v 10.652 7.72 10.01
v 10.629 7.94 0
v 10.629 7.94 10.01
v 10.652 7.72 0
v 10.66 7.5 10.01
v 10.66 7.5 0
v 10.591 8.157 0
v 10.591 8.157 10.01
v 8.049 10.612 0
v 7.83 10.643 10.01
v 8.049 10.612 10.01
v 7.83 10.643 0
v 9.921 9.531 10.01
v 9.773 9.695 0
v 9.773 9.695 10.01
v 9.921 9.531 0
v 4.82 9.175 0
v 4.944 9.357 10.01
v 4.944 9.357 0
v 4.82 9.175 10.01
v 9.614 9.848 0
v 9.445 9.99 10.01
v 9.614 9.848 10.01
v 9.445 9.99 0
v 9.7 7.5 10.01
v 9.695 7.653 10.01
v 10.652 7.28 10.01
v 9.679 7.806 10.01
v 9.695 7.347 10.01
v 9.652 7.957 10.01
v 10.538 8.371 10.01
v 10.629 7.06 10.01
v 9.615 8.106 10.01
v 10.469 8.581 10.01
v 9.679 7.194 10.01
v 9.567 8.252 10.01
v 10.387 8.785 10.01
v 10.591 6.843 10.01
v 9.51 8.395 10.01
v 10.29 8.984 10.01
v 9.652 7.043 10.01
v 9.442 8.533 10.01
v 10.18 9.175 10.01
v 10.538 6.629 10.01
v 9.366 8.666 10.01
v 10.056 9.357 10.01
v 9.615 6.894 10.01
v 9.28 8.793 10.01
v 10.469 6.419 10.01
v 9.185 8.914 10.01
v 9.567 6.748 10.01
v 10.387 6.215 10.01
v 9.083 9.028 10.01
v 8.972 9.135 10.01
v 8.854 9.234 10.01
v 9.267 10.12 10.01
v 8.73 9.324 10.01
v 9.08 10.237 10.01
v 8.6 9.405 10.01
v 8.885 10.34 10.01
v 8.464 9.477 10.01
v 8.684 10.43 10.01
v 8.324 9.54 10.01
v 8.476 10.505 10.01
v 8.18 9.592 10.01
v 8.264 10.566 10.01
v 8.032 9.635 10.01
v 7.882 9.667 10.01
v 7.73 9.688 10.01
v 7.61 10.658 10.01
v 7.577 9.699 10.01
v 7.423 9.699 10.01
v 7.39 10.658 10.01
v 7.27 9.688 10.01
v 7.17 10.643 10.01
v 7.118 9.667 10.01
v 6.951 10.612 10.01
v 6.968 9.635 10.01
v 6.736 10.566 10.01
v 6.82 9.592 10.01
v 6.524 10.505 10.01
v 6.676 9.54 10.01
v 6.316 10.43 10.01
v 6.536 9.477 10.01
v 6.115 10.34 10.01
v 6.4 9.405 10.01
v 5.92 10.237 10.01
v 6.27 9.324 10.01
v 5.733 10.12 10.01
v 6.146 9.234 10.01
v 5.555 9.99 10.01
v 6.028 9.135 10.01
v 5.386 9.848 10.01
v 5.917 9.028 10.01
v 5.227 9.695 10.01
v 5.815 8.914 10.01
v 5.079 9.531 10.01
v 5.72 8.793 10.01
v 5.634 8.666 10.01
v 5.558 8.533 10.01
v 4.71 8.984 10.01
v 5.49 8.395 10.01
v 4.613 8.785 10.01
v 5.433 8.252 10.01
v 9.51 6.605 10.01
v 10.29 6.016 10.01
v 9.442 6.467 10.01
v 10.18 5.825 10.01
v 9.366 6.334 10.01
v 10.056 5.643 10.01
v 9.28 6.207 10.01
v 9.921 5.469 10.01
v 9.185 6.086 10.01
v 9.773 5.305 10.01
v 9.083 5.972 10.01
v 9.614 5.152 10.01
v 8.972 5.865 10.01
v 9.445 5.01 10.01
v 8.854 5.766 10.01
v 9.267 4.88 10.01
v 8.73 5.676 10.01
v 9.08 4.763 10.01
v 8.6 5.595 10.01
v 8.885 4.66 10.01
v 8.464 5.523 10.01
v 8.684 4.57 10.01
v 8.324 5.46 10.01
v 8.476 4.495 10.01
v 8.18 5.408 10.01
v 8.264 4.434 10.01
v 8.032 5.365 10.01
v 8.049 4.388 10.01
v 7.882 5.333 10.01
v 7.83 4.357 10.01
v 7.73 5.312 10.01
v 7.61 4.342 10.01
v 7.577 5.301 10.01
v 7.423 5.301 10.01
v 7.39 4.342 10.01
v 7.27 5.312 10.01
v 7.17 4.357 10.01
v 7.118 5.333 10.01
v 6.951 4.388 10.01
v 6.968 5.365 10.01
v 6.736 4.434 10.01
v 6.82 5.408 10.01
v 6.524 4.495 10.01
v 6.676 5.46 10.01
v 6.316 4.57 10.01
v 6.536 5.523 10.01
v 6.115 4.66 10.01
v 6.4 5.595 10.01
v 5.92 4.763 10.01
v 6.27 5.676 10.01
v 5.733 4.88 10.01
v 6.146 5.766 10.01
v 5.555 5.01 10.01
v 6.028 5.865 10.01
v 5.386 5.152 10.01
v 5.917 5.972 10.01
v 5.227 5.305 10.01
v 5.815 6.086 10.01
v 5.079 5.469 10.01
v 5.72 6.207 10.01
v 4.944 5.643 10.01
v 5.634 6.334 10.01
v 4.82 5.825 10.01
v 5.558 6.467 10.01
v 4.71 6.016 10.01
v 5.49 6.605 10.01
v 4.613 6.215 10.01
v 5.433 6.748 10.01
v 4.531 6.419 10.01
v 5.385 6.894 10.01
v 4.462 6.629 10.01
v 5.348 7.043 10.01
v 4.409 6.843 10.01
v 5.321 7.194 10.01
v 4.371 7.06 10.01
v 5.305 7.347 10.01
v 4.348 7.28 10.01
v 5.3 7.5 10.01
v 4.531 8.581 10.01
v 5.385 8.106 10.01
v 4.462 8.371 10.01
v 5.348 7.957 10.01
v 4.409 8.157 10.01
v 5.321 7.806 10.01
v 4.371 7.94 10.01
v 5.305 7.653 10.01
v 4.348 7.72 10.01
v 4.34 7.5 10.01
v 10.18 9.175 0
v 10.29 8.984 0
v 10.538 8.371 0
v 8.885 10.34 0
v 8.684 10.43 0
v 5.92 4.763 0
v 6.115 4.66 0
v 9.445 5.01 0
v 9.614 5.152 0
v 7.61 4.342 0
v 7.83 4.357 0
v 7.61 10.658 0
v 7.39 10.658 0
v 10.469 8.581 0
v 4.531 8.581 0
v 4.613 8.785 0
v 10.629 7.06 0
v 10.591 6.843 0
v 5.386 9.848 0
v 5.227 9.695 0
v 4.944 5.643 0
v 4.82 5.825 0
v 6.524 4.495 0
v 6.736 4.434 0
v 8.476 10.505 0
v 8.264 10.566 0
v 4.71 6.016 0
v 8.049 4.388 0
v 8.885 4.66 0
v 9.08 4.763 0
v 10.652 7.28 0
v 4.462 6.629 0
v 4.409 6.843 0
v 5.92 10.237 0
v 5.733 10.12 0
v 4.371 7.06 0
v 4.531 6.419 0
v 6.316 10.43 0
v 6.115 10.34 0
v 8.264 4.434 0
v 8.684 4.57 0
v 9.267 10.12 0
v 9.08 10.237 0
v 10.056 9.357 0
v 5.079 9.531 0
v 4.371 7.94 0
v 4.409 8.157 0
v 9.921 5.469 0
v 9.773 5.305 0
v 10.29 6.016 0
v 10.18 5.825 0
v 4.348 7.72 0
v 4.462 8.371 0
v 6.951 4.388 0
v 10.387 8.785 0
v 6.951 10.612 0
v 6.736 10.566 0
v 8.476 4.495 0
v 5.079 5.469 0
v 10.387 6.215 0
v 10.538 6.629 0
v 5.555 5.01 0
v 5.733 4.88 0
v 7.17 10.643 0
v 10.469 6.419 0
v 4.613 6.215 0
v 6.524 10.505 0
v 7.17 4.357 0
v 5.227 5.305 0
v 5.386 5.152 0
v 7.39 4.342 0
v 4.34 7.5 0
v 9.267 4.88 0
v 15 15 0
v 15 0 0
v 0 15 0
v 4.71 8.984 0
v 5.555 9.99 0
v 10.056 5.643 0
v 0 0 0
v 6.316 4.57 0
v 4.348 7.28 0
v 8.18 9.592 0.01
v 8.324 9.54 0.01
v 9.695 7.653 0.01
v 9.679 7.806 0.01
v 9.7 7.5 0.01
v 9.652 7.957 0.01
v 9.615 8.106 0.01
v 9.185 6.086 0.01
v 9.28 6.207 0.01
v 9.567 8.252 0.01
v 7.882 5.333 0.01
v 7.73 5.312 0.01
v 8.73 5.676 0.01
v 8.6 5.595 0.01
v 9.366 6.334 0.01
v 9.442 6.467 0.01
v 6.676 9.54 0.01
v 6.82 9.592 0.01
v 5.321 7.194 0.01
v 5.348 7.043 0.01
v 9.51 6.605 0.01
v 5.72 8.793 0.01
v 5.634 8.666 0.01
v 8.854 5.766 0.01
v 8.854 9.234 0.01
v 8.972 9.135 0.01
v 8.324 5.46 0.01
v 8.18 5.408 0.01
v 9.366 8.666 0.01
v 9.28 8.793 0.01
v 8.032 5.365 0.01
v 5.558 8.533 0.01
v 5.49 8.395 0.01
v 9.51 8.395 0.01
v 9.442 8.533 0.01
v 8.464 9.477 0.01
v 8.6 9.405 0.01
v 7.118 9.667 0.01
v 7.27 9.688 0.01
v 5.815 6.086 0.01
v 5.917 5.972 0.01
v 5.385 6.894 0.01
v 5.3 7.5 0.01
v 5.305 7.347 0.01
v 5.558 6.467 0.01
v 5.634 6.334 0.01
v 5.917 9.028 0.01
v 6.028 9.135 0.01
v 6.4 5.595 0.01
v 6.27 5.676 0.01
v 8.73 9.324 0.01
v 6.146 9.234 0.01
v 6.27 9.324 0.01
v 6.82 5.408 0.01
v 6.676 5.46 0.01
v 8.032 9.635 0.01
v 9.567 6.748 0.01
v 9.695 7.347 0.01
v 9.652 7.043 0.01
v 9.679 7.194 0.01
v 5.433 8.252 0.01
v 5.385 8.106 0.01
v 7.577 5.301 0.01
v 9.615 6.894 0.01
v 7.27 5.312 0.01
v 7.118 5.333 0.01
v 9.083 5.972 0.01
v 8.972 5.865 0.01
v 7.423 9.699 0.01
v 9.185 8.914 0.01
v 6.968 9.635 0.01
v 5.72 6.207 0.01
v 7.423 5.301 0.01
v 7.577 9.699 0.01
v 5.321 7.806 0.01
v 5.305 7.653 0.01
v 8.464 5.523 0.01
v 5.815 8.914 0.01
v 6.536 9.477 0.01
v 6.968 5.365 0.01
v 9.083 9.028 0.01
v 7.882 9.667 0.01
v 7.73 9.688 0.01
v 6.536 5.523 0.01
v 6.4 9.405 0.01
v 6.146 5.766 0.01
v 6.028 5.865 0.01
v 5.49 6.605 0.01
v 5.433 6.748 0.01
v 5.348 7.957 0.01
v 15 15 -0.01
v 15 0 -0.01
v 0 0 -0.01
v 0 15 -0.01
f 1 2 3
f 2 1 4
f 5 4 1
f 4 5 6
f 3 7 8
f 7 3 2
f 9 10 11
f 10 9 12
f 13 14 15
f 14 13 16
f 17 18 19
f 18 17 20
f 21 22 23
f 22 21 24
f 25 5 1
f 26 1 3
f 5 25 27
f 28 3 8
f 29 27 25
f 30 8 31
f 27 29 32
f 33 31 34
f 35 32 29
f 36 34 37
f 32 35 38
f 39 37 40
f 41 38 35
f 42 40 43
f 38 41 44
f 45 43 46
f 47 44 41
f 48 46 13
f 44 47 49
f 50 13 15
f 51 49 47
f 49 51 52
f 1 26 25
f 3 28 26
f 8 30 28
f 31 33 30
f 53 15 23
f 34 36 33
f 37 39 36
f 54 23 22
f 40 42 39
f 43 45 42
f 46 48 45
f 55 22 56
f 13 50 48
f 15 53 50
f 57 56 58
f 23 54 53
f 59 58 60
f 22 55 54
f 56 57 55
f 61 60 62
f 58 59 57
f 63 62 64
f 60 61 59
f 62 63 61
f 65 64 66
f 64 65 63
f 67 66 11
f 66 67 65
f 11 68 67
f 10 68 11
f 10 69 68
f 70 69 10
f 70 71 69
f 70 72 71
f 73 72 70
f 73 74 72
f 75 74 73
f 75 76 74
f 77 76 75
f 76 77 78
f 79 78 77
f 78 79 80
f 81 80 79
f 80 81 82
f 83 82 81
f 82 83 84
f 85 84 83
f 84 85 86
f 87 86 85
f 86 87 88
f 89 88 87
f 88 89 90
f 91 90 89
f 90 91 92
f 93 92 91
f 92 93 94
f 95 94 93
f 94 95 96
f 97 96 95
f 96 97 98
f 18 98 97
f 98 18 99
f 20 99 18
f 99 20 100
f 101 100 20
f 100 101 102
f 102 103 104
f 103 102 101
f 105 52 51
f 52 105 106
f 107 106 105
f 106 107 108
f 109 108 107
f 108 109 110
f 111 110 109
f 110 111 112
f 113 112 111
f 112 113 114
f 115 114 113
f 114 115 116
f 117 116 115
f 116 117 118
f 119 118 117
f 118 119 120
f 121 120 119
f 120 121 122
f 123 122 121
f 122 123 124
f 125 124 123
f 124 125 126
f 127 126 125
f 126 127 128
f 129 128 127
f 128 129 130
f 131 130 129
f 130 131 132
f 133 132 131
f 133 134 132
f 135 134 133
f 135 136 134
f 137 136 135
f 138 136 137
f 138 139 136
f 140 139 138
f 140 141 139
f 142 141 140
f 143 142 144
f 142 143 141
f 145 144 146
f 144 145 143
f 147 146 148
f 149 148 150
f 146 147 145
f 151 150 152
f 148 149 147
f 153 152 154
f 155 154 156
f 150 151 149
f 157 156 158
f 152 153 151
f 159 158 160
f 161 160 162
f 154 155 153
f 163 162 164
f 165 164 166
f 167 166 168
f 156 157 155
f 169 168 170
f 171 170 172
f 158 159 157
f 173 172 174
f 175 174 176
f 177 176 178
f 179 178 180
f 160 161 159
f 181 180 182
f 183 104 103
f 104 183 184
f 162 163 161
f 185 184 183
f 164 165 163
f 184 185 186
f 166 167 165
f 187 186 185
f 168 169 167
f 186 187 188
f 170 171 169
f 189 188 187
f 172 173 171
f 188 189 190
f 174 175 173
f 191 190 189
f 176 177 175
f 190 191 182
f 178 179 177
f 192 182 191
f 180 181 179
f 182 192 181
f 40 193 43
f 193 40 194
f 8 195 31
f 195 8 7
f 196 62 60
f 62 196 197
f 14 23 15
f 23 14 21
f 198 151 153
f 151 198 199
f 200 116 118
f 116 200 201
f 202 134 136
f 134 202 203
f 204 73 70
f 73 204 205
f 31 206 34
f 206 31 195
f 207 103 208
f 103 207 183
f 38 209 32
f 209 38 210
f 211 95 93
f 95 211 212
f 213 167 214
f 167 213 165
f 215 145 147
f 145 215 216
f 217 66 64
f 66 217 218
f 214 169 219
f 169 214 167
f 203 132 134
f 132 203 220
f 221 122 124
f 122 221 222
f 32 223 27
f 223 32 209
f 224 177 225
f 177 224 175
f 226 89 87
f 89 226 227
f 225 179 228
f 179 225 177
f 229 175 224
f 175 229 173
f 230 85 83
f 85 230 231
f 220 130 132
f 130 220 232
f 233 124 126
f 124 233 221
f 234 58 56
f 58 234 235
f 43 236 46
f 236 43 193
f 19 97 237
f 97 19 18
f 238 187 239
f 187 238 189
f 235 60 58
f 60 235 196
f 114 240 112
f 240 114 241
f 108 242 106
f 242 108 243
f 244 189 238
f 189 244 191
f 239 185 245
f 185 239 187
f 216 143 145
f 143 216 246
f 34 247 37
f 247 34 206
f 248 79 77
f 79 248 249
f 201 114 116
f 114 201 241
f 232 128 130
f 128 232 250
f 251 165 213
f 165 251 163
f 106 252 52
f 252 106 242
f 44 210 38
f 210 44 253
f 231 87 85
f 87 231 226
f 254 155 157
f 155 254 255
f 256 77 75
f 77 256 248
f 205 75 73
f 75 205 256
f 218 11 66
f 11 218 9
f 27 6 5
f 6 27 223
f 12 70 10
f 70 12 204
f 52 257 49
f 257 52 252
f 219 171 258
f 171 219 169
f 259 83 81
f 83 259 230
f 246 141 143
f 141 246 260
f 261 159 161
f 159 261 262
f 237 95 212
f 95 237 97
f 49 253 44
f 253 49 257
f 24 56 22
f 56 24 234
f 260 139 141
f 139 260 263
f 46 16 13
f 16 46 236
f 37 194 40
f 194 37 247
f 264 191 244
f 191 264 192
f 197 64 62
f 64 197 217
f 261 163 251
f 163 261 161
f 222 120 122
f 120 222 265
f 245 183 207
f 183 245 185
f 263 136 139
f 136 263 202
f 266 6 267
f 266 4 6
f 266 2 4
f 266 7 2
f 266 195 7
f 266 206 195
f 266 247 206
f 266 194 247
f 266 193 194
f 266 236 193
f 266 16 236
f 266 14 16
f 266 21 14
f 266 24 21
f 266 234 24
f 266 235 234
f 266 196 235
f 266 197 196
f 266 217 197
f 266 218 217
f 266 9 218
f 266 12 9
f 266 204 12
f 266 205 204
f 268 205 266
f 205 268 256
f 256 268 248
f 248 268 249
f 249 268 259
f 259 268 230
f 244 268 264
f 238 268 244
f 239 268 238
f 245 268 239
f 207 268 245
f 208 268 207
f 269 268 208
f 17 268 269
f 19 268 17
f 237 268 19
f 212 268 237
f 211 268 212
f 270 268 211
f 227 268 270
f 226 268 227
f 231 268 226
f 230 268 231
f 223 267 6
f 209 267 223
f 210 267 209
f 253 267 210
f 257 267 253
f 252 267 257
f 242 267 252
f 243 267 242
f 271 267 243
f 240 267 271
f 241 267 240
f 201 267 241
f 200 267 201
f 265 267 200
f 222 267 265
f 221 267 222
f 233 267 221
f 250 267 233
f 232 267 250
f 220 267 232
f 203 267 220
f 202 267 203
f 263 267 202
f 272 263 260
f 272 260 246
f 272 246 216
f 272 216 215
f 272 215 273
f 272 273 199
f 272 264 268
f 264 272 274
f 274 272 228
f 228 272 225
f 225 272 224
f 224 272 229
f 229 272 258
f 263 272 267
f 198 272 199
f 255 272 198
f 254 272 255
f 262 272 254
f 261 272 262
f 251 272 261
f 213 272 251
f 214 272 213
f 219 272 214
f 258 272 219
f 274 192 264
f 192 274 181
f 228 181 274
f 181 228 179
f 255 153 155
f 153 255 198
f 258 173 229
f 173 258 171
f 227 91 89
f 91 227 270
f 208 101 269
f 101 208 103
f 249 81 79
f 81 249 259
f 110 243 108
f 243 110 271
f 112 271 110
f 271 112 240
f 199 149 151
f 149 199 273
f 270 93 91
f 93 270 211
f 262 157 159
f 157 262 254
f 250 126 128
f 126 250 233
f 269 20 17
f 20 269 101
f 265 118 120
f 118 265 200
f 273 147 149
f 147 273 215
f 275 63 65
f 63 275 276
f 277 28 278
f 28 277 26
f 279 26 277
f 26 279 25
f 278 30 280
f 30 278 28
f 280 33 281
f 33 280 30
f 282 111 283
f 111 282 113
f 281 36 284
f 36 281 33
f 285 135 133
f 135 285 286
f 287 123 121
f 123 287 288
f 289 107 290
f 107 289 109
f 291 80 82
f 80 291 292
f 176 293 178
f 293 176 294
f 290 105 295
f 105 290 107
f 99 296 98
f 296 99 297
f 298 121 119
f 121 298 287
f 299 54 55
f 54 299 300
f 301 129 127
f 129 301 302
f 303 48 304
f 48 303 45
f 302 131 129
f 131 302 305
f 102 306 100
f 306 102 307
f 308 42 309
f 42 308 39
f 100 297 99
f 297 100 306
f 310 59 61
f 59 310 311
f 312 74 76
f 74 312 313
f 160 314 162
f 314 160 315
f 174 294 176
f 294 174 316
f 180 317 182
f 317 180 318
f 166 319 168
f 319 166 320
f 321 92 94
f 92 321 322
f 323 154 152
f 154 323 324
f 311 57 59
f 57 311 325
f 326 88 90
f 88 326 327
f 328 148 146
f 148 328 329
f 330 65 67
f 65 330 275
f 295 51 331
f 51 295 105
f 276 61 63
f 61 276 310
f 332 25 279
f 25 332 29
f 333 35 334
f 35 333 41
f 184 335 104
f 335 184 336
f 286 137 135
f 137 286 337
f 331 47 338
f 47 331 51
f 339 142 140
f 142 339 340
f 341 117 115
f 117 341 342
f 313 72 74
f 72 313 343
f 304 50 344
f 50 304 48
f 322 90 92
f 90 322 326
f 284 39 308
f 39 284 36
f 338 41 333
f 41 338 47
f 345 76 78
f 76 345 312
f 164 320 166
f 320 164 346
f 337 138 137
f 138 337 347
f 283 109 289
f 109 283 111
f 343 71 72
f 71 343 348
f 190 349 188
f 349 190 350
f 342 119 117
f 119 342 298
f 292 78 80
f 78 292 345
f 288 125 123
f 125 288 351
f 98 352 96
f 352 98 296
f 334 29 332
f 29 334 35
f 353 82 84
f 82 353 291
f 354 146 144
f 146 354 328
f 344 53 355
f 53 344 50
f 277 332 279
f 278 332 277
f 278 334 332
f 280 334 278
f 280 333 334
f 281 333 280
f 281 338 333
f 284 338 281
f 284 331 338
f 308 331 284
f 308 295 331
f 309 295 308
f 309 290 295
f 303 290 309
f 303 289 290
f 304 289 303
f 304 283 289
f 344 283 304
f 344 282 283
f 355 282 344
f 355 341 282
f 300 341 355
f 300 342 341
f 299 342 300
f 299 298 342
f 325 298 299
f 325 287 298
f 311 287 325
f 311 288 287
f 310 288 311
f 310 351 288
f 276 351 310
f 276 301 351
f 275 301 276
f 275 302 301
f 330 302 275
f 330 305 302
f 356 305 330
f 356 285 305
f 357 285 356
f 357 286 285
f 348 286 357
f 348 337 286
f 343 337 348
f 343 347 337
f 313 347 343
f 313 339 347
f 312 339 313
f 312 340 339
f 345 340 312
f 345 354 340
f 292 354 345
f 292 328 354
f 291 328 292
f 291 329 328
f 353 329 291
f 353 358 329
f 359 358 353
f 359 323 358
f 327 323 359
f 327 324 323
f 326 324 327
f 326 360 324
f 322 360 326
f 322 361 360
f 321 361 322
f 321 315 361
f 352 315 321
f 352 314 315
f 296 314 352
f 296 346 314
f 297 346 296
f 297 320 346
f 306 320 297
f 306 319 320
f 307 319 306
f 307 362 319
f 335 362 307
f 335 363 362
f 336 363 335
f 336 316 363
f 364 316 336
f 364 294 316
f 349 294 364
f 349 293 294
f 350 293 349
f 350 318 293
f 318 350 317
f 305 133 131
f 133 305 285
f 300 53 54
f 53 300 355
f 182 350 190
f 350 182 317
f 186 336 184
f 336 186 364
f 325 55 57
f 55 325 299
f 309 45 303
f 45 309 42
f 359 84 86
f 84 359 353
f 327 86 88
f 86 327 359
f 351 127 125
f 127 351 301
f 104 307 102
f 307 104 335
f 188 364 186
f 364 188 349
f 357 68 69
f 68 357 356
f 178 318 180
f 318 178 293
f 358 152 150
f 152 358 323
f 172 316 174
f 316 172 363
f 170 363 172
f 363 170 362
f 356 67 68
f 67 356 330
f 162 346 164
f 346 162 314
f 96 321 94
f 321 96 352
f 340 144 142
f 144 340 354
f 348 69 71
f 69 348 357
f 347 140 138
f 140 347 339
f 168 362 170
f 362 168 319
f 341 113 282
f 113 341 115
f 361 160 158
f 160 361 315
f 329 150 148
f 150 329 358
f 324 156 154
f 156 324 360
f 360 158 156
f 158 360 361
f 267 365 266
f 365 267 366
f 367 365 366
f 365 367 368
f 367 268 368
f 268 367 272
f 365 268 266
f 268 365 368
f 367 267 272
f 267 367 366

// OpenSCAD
// file: ../Base/PlacementOptions.scad
// Fischertechnik Box Foundation
// Placement Options

// Alignment
NoAlign = 0;
AlignLeft = 1;
AlignBottom = 2;
AlignCenter = 3;
AlignRight = 4;
AlignTop = 5;

// Element rotation degree steps
rotations = [0, -90, -180, -270];

// Rotation
NoRotation = 0;
Rotate0 = 0;
Rotate90 = 1;
Rotate180 = 2;
Rotate270 = 3;

// Docking (seen from above)
NoDock = -1;
DockLeft = 0;
DockTop = 1;
DockRight = 2;
DockCorner = 2;
DockBottom = 3;

// Web corners
LowerLeft = 0;
UpperLeft = 1;
UpperRight = 2;
LowerRight = 3;

// Web position relative to corner
LeftOfCorner = 0;
RightOfCorner = 1;

// Rails direction
Horizontal = true;
Vertical = false;
// file: ../Base/Boxes.scad
// Fischertechnik Box Foundation
// Pre-designed Boxes

use <Constants.scad>

include <PlacementOptions.scad>

box190Width = 190;
box190Depth = 130;
box130Width = 130;
box130Depth = 95;

// Values are from an original ec3 box
topBottomDifference = 1.5;
outerHeight = 40;
baseThickness = 1.8;
innerHeight = outerHeight - baseThickness;
stackExcess = 5.7;
radius = 3.5;
wallThickness = 1.5;
tolerance = 0.2;

boxWallThickness = wallThickness;
boxBaseThickness = baseThickness;
boxWebWidth = 3.0;

// getBoxWallThickness()
// Gets the wall thickness of a Fischertechnik Box
function getBoxWallThickness() = boxWallThickness;

// getBoxUsageHeight(height = 38.2)
// Gets the usable height of a Fischertechnik box
// height = Outer height of the box from the bottom to the upper edge.
function getBoxUsageHeight(height = outerHeight) = height - baseThickness - stackExcess;

// getBoxInnerHeight()
// Gets the inner height of a Fischertechnik box, including the stack excess
function getBoxInnerHeight() = innerHeight;

// getBoxBaseThickness()
// Gets the thickness of the Fischertechnik box base.
function getBoxBaseThickness() = boxBaseThickness;

// getBoxWebWidth()
// Gets the width of a box web
function getBoxWebWidth() = boxWebWidth;

// getBox190Space()
// Gets the usable inner space of a Box 190 as an x/y-list
function getBox190Space() = [
    box190Width - 2*getBoxWallThickness() - topBottomDifference, 
    box190Depth - 2*getBoxWallThickness() - topBottomDifference ];

// RoundedCornerPlate(width, depth, height, radius)
// Creates a body plate with rounded corners for a box. Used
// also to create the complete box with the hull module.
// width = Width of the plate
// depth = depth of the plate 
// height = thickness of the plate
// radius = radius of the rounded corner
module RoundedCornerPlate(width, depth, height, radius) {
    translate([radius, radius])
    hull() {
        w = width-2*radius;
        d = depth-2*radius;
        cube([w, d, height]);
        cylinder(height, r=radius, $fn=getFragments());
        translate([w, 0])
            cylinder(height, r=radius, $fn=getFragments());
        translate([w, d])
            cylinder(height, r=radius, $fn=getFragments());
        translate([0, d])
            cylinder(height, r=radius, $fn=getFragments());
    }
}

// BoxBase(width, depth)
// Creates an empty stackable Fischertechnik compatible box
// width = Outer width of the box (190, 130, ...)
// depth = Outer depth of the box (130, 95, ...)

module BoxBase(width, depth, height=outerHeight) {    
    thinPlate = 0.01;

    innerHeight = height - baseThickness;    
    
    module Body(tolerance=tolerance) {
        hull() {
            // Bottom with tolerance to fit into the original boxes when stacked
            translate([-wallThickness+tolerance, -wallThickness+tolerance, -baseThickness])
                RoundedCornerPlate(width-topBottomDifference-2*tolerance, depth-topBottomDifference-2*tolerance, thinPlate, radius);
            
            // Top
            translate([-wallThickness-topBottomDifference/2, -wallThickness-topBottomDifference/2, innerHeight-thinPlate])
                RoundedCornerPlate(width, depth, thinPlate, radius);
         }
    }

    module Cutoff() {
        hull() {
            coWidth = width - 2*wallThickness;
            coDepth = depth - 2*wallThickness;
            
            // Bottom
            RoundedCornerPlate(coWidth-topBottomDifference, coDepth-topBottomDifference, thinPlate, radius);

            // Top
            translate([-topBottomDifference/2, -topBottomDifference/2, innerHeight+thinPlate]) 
                RoundedCornerPlate(coWidth, coDepth, thinPlate, radius);
        }
    }
    
    difference() {        
        Body();
        Cutoff();
        stackOffset = innerHeight - stackExcess;
        translate([0, 0, stackOffset + baseThickness])
            Body(tolerance=0);
    }
}

// Creates the Fischertechnik empty box 130x190 mm and places it at position 0,0
// 190x130 are the outer sizes, the inner space is slightly smaller. Use getBox190Space() to get the inner sizes.
// The box is positioned that the usable inner space is at the 0,0,0 position.

module Box190() {
    BoxBase(box190Width, box190Depth);
}

// Gets the usable inner space of a Box 130 as an x/y-list
function getBox130Space() = [
    box130Width - 2*getBoxWallThickness() - topBottomDifference, 
    box130Depth - 2*getBoxWallThickness() - topBottomDifference ];

// Creates the Fischertechnik empty box 95x130 mm and places it at position 0,0
// 190x130 are the outer sizes, the inner space is slightly smaller. Use getBox190Space() to get the inner sizes.
// The box is positioned that the usable inner space is at the 0,0,0 position.

module Box130() {
    BoxBase(box130Width, box130Depth);
}

// Creates a web at the specified box walls
// corner 0 = LowerLeft, 1 = UpperLeft, 2 = UpperRight, 3 = LowerRight
// side 0 = LeftOfCorner, 1 = RightOfCorner
// distance = Distance in mm from the corner
// boxSpace = inner width and depth of the box (default: Box 190)
// webWidth = length of the web (default is 3 mms)
// webThickness = thickness of the web (default is 1 mm)
// height = Height of the web (standard is getBoxUsageHeight())
// sink = How much of the web is sunk into the wall

module BoxWeb(
    corner, 
    side, 
    distance, 
    boxSpace=getBox190Space(), 
    webWidth=getBoxWebWidth(), 
    webThickness=1.0, 
    height=getBoxUsageHeight(),
    sink = getBoxWallThickness()/2) {
    width = (corner % 2 == 0) ? 
            (side == LeftOfCorner ? webWidth : webThickness) :
            (side == LeftOfCorner ? webThickness : webWidth);

    depth = (corner % 2 == 0) ? 
            (side == RightOfCorner ? webWidth : webThickness) :
            (side == RightOfCorner ? webThickness : webWidth);
    
    xDiff = corner == LowerLeft ? 
                (side == LeftOfCorner ? -sink : distance) :
            (corner == UpperLeft ?                
                (side == LeftOfCorner ? distance : -sink) :
            (corner == UpperRight ?
                (side == LeftOfCorner ? boxSpace.x-webWidth+sink : boxSpace.x-distance-webThickness) :
                (side == LeftOfCorner ? boxSpace.x-distance-webThickness: boxSpace.x-webWidth+sink)));

    yDiff = corner == LowerLeft ? 
                (side == RightOfCorner ? -sink : distance) :
            (corner == UpperLeft ?
                (side == RightOfCorner ? boxSpace.y-distance-webThickness : boxSpace.y-webWidth+sink) :
            (corner == UpperRight ?
                (side == RightOfCorner ? boxSpace.y-webWidth+sink : boxSpace.y-distance-webThickness) :
                (side == RightOfCorner ? distance : -sink)));
    
    translate([xDiff, yDiff, -getExcess()])
        cube([width, depth, height + 2*getExcess()]);
}
// file: ../Base/Rotation.scad
// Fischertechnik Box Foundation
// Geometry Helpers Rotation

include <PlacementOptions.scad>

// getRotatedSpace(space, rotation=NoRotation)
// Rotates the space dependent on the specified rotation

function getRotatedSpace(space, rotation=NoRotation) = [
    (rotation == Rotate90 || rotation == Rotate270) ? space.y : space.x,
    (rotation == Rotate90 || rotation == Rotate270) ? space.x : space.y
];

// Rotates the given space around the fixed left lower corner
// space = the space the children needs as width/depth list [width,depth]
// rotation = 0 Rotate0 degrees, 1 Rotate90 degrees, 2 Rotate180 degrees, 3 Rotate270 degrees (equivalent to -90)

module RotateFix(space, rotation=NoRotation) {
    dy = (rotation == Rotate0 || rotation == Rotate270) ? 0 :
        (rotation == Rotate90) ? space.x :
        space.y;
    dx = (rotation < Rotate180) ? 0 :
        (rotation == Rotate180) ? space.x :
        space.y;
    
    translate([dx, dy, 0])
        rotate([0, 0, rotations[rotation]])
            children();
}
// file: ../Base/Alignment.scad
// Fischertechnik Box Foundation
// Geometry Helpers Alignment

include <PlacementOptions.scad>

// getAlignedX(elementWidth, spaceWidth, align=AlignRight, offset=0)
// Gets the aligned X offset of an element with the given
// width in the given space.
// elementWidth = The width of the element to positon
// spaceWidth = The space where the element should be aligned
// align = 0 AlignLeft, 1 AlignCenter, 2 AlignRight
// offset = an optional offset from the aligned position. When
// aligned left or centered, then positive values are in X direction.
// When aligned right then positive values are in negative X direction.

function getAlignedX(elementWidth, spaceWidth, align=AlignRight, offset=0) =
    (align == AlignLeft) ?
        offset :
        ((align == AlignCenter) ?
        (spaceWidth - elementWidth)/2 + offset :
        spaceWidth - offset - elementWidth);

// getAlignedY(elementDepth, spaceDepth, align=AlignTop, offset=0)
// Gets the aligned Y offset of an element with the given
// depth in the given space.
// elementDepth = The depth of the element to positon
// spaceDepth = The space where the element should be aligned
// align = 0 AlignBottom, 1 AlignCenter, 2 AlignTop
// offset = an optional offset from the aligned position. When
// aligned bottom or centered, then positive values are in Y direction.
// When aligned top then positive values are in negative Y direction.

function getAlignedY(elementDepth, spaceDepth, align=AlignTop, offset=0) =
    (align == AlignBottom) ?
        offset :
        ((align == AlignCenter) ?
        (spaceDepth - elementDepth)/2 + offset :
        spaceDepth - offset - elementDepth);
// file: ../Base/Placement.scad
// Fischertechnik Box Foundation
// Geometry Helpers Placement

use <Constants.scad>
use <Alignment.scad>
use <Rotation.scad>
use <Boxes.scad>

include <PlacementOptions.scad>

// Place(x=0, y=0, elementSpace=[0,0], alignX=AlignLeft, alignY=AlignBottom, rotation=Rotate0, boxSpace=getBox190Space())
// Places the child at the specified position
// y = Y-Position. This is a relative position when an X aligment is specified.
// x = X-Position. This is a relative position when an Y aligment is specified.
// elementSpace = space of the element to be placed [x,y]
// alignX = -1=NoAlign, 0 AlignLeft, 1 AlignCenter, 3 AlignRight (elementSpace and boxSpace required!)
// alignY = -1=NoAlign, 2 AlignBottom, 1 AlignCenter, 4 AlignTop (elementSpace and boxSpace required!)
// rotation = 0 Rotate0 0 degrees, 1 Rotate90 90 degrees, 
// 2 Rotate180 180 degrees, 3 Rotate270 270 degrees (equivalent to -90)
// boxSpace = Inner space of the box where the placement occurs [x,y] - default is Box 190x130 inner space

module Place(x=0, y=0, elementSpace=[0,0], 
  alignX=AlignLeft, alignY=AlignBottom, 
  rotation=NoRotation, boxSpace=getBox190Space()) {

    module Position(x, y, space, rotation=Rotate0) {
        translate([x, y, 0])
            RotateFix(space, rotation)
                children();
    }

    space = getRotatedSpace(elementSpace, rotation);
    alignedX = getAlignedX(space.x, boxSpace.x, alignX, x);
    alignedY = getAlignedY(space.y, boxSpace.y, alignY, y);
    Position(alignedX, alignedY, elementSpace, rotation)
        children();
}

// Center(space=getBox130Space(), elementSpace=[0,0])
// space = Space where the children is centered. For cylinder use centered=true and no elementSpace.
// elementSpace = space of the element to be centered [x,y]

module Center(space=getBox190Space(), elementSpace=[0,0]) {
    Place(elementSpace=elementSpace, boxSpace=space, alignX=AlignCenter, alignY=AlignCenter)
        children();
}

// CenterHorizontal(width=0, y=0, offset=0, space=getBox130Space())
// width = Width of the element to be placed.
// y = Y position of the element
// offset = Offset from the center position (negative will be left of the center)
// space = Space where the element is placed

module CenterHorizontal(width=0, y=0, offset=0, space=getBox190Space()) {
    Place(x=offset, y=y, elementSpace=[width, 0], boxSpace=space, alignX=AlignCenter)
        children(0);
}

// CenterVertical(depth=0, x=0, offset=0, space=getBox130Space())
// depth = Depth of the element to be placed.
// x = X position of the element
// offset = Offset from the center position (negative will be down of the center)
// space = Space where the element is placed

module CenterVertical(depth=0, x=0, offset=0, space=getBox190Space()) {
    Place(x=x, y=offset, elementSpace=[0, depth], boxSpace=space, alignY=AlignCenter)
        children(0);
}

// getIsVertical(align)
// True if the specified alignment needs a vertical orientation for a divider (AlignRight, AlignLeft)

function getIsVertical(align) = (align == AlignRight || align == AlignLeft);

// getIsHorizontal(align)
// True if the specified alignment needs a horizontal orientation for a divider (AlignTop, AlignBottom)

function getIsHorizontal(align) = (align == AlignTop || align == AlignBottom);
// file: ../Base/Constants.scad
// Fischertechnik Box Foundation
// Constants

// Constant values necessary for multiple elements

// Base constants
dividerThickness = 1.2;
excess = 0.01;
fragments = 90;
tolerance = 0.8;

// Gets the thickness of a divider 
function getDividerThickness() = dividerThickness;

// Gets the excess that is used to merge walls into each other
function getExcess() = excess;

// Gets amount of fragments of a cylinder
function getFragments() = fragments;

// Gets the inner tolerance of a frame to each side
function getTolerance() = tolerance;


// Fischertechnik specific constants
axisDiameter = 4;
axisBottomDiameter = axisDiameter + 1;
axisTolerance = 0.2;
axisLockingLength = 8;

// Gets axis diameter of Fischertechnik axis
function getAxisDiameter() = axisDiameter;

// Gets axis diameter tolerance (subtracted for element axis)
function getAxisTolerance() = axisTolerance;

// Gets the axis diameter for standing axis
function getStandAxisDiameter() = getAxisDiameter() - getAxisTolerance();

// Gets axis bottom diameter for thicker part at the bottom
function getAxisBottomDiameter() = axisBottomDiameter;

// Gets the lengthh of the locking part of a locking axis
function getAxisLockingLength() = axisLockingLength;

pinHeight = 2.5;
pinTolerance = 0.2;

// gets the height of a connecting pin
function getPinHeight() = pinHeight;

// gets the connecting pin height tolerance
function getPinTolerance() = pinTolerance;

standardEdgeDistance = 2.5;
standardWebDistance = 11.5;
standardCornerLength = 15;

// gets the standard distance to the wall of the box for dockable frames with webs
function getStandardEdgeDistance() = standardEdgeDistance;

// gets the standard distance of each web to the corner of the dockable frame
function getStandardWebDistance() = standardWebDistance;

// gets the standard length of the corner walls of a dockable frame
function getStandardCornerLength() = standardCornerLength;

tubeWallFactor = 0.8;

// gets the wall thickness of a tube.
function getTubeWallThickness() = tubeWallFactor * getDividerThickness();

smallPartsFrameHeight = 20;

// gets the frame height for docked small parts boxes.
function getSmallPartsFrameHeight() = smallPartsFrameHeight;

hubRingDiameter = 19.5;
hubRingLevelDiameter = 21;

// gets the diameter of a tube matching the inner ring of a wheel
function getHubRingDiameter() = hubRingDiameter;

// gets the diameter of a hub tube with a thicker diameter
function getHubRingLevelDiameter() = hubRingLevelDiameter;
// main file
// Fischertechnik Box Library
// Cylinder for standing locking axis with gear Z28
// 31082

use <../Base/Constants.scad>
use <../Base/Placement.scad>
use <../ModelBase/Simple.scad>
use <../ModelBase/Complex.scad>

/* [Hidden] */
width = 15;
depth = 15;
height = 10;

// getCylinderLockingGearZ28Space()
// Gets the space the cylinder for a 30 mm axis needs

function getCylinderLockingGearZ28Space() = [width, depth, height];

// CylinderLockingGearZ28()
// Standing cylinder for locking axis with gear Z28
// 31034

module CylinderLockingGearZ28() {
    Space(getCylinderLockingGearZ28Space());
    
    Center(getCylinderLockingGearZ28Space())
        Tube(height, innerDiameter=getFrameAxisDepth());
}

// Tests
color("lightgray")
CylinderLockingGearZ28();
